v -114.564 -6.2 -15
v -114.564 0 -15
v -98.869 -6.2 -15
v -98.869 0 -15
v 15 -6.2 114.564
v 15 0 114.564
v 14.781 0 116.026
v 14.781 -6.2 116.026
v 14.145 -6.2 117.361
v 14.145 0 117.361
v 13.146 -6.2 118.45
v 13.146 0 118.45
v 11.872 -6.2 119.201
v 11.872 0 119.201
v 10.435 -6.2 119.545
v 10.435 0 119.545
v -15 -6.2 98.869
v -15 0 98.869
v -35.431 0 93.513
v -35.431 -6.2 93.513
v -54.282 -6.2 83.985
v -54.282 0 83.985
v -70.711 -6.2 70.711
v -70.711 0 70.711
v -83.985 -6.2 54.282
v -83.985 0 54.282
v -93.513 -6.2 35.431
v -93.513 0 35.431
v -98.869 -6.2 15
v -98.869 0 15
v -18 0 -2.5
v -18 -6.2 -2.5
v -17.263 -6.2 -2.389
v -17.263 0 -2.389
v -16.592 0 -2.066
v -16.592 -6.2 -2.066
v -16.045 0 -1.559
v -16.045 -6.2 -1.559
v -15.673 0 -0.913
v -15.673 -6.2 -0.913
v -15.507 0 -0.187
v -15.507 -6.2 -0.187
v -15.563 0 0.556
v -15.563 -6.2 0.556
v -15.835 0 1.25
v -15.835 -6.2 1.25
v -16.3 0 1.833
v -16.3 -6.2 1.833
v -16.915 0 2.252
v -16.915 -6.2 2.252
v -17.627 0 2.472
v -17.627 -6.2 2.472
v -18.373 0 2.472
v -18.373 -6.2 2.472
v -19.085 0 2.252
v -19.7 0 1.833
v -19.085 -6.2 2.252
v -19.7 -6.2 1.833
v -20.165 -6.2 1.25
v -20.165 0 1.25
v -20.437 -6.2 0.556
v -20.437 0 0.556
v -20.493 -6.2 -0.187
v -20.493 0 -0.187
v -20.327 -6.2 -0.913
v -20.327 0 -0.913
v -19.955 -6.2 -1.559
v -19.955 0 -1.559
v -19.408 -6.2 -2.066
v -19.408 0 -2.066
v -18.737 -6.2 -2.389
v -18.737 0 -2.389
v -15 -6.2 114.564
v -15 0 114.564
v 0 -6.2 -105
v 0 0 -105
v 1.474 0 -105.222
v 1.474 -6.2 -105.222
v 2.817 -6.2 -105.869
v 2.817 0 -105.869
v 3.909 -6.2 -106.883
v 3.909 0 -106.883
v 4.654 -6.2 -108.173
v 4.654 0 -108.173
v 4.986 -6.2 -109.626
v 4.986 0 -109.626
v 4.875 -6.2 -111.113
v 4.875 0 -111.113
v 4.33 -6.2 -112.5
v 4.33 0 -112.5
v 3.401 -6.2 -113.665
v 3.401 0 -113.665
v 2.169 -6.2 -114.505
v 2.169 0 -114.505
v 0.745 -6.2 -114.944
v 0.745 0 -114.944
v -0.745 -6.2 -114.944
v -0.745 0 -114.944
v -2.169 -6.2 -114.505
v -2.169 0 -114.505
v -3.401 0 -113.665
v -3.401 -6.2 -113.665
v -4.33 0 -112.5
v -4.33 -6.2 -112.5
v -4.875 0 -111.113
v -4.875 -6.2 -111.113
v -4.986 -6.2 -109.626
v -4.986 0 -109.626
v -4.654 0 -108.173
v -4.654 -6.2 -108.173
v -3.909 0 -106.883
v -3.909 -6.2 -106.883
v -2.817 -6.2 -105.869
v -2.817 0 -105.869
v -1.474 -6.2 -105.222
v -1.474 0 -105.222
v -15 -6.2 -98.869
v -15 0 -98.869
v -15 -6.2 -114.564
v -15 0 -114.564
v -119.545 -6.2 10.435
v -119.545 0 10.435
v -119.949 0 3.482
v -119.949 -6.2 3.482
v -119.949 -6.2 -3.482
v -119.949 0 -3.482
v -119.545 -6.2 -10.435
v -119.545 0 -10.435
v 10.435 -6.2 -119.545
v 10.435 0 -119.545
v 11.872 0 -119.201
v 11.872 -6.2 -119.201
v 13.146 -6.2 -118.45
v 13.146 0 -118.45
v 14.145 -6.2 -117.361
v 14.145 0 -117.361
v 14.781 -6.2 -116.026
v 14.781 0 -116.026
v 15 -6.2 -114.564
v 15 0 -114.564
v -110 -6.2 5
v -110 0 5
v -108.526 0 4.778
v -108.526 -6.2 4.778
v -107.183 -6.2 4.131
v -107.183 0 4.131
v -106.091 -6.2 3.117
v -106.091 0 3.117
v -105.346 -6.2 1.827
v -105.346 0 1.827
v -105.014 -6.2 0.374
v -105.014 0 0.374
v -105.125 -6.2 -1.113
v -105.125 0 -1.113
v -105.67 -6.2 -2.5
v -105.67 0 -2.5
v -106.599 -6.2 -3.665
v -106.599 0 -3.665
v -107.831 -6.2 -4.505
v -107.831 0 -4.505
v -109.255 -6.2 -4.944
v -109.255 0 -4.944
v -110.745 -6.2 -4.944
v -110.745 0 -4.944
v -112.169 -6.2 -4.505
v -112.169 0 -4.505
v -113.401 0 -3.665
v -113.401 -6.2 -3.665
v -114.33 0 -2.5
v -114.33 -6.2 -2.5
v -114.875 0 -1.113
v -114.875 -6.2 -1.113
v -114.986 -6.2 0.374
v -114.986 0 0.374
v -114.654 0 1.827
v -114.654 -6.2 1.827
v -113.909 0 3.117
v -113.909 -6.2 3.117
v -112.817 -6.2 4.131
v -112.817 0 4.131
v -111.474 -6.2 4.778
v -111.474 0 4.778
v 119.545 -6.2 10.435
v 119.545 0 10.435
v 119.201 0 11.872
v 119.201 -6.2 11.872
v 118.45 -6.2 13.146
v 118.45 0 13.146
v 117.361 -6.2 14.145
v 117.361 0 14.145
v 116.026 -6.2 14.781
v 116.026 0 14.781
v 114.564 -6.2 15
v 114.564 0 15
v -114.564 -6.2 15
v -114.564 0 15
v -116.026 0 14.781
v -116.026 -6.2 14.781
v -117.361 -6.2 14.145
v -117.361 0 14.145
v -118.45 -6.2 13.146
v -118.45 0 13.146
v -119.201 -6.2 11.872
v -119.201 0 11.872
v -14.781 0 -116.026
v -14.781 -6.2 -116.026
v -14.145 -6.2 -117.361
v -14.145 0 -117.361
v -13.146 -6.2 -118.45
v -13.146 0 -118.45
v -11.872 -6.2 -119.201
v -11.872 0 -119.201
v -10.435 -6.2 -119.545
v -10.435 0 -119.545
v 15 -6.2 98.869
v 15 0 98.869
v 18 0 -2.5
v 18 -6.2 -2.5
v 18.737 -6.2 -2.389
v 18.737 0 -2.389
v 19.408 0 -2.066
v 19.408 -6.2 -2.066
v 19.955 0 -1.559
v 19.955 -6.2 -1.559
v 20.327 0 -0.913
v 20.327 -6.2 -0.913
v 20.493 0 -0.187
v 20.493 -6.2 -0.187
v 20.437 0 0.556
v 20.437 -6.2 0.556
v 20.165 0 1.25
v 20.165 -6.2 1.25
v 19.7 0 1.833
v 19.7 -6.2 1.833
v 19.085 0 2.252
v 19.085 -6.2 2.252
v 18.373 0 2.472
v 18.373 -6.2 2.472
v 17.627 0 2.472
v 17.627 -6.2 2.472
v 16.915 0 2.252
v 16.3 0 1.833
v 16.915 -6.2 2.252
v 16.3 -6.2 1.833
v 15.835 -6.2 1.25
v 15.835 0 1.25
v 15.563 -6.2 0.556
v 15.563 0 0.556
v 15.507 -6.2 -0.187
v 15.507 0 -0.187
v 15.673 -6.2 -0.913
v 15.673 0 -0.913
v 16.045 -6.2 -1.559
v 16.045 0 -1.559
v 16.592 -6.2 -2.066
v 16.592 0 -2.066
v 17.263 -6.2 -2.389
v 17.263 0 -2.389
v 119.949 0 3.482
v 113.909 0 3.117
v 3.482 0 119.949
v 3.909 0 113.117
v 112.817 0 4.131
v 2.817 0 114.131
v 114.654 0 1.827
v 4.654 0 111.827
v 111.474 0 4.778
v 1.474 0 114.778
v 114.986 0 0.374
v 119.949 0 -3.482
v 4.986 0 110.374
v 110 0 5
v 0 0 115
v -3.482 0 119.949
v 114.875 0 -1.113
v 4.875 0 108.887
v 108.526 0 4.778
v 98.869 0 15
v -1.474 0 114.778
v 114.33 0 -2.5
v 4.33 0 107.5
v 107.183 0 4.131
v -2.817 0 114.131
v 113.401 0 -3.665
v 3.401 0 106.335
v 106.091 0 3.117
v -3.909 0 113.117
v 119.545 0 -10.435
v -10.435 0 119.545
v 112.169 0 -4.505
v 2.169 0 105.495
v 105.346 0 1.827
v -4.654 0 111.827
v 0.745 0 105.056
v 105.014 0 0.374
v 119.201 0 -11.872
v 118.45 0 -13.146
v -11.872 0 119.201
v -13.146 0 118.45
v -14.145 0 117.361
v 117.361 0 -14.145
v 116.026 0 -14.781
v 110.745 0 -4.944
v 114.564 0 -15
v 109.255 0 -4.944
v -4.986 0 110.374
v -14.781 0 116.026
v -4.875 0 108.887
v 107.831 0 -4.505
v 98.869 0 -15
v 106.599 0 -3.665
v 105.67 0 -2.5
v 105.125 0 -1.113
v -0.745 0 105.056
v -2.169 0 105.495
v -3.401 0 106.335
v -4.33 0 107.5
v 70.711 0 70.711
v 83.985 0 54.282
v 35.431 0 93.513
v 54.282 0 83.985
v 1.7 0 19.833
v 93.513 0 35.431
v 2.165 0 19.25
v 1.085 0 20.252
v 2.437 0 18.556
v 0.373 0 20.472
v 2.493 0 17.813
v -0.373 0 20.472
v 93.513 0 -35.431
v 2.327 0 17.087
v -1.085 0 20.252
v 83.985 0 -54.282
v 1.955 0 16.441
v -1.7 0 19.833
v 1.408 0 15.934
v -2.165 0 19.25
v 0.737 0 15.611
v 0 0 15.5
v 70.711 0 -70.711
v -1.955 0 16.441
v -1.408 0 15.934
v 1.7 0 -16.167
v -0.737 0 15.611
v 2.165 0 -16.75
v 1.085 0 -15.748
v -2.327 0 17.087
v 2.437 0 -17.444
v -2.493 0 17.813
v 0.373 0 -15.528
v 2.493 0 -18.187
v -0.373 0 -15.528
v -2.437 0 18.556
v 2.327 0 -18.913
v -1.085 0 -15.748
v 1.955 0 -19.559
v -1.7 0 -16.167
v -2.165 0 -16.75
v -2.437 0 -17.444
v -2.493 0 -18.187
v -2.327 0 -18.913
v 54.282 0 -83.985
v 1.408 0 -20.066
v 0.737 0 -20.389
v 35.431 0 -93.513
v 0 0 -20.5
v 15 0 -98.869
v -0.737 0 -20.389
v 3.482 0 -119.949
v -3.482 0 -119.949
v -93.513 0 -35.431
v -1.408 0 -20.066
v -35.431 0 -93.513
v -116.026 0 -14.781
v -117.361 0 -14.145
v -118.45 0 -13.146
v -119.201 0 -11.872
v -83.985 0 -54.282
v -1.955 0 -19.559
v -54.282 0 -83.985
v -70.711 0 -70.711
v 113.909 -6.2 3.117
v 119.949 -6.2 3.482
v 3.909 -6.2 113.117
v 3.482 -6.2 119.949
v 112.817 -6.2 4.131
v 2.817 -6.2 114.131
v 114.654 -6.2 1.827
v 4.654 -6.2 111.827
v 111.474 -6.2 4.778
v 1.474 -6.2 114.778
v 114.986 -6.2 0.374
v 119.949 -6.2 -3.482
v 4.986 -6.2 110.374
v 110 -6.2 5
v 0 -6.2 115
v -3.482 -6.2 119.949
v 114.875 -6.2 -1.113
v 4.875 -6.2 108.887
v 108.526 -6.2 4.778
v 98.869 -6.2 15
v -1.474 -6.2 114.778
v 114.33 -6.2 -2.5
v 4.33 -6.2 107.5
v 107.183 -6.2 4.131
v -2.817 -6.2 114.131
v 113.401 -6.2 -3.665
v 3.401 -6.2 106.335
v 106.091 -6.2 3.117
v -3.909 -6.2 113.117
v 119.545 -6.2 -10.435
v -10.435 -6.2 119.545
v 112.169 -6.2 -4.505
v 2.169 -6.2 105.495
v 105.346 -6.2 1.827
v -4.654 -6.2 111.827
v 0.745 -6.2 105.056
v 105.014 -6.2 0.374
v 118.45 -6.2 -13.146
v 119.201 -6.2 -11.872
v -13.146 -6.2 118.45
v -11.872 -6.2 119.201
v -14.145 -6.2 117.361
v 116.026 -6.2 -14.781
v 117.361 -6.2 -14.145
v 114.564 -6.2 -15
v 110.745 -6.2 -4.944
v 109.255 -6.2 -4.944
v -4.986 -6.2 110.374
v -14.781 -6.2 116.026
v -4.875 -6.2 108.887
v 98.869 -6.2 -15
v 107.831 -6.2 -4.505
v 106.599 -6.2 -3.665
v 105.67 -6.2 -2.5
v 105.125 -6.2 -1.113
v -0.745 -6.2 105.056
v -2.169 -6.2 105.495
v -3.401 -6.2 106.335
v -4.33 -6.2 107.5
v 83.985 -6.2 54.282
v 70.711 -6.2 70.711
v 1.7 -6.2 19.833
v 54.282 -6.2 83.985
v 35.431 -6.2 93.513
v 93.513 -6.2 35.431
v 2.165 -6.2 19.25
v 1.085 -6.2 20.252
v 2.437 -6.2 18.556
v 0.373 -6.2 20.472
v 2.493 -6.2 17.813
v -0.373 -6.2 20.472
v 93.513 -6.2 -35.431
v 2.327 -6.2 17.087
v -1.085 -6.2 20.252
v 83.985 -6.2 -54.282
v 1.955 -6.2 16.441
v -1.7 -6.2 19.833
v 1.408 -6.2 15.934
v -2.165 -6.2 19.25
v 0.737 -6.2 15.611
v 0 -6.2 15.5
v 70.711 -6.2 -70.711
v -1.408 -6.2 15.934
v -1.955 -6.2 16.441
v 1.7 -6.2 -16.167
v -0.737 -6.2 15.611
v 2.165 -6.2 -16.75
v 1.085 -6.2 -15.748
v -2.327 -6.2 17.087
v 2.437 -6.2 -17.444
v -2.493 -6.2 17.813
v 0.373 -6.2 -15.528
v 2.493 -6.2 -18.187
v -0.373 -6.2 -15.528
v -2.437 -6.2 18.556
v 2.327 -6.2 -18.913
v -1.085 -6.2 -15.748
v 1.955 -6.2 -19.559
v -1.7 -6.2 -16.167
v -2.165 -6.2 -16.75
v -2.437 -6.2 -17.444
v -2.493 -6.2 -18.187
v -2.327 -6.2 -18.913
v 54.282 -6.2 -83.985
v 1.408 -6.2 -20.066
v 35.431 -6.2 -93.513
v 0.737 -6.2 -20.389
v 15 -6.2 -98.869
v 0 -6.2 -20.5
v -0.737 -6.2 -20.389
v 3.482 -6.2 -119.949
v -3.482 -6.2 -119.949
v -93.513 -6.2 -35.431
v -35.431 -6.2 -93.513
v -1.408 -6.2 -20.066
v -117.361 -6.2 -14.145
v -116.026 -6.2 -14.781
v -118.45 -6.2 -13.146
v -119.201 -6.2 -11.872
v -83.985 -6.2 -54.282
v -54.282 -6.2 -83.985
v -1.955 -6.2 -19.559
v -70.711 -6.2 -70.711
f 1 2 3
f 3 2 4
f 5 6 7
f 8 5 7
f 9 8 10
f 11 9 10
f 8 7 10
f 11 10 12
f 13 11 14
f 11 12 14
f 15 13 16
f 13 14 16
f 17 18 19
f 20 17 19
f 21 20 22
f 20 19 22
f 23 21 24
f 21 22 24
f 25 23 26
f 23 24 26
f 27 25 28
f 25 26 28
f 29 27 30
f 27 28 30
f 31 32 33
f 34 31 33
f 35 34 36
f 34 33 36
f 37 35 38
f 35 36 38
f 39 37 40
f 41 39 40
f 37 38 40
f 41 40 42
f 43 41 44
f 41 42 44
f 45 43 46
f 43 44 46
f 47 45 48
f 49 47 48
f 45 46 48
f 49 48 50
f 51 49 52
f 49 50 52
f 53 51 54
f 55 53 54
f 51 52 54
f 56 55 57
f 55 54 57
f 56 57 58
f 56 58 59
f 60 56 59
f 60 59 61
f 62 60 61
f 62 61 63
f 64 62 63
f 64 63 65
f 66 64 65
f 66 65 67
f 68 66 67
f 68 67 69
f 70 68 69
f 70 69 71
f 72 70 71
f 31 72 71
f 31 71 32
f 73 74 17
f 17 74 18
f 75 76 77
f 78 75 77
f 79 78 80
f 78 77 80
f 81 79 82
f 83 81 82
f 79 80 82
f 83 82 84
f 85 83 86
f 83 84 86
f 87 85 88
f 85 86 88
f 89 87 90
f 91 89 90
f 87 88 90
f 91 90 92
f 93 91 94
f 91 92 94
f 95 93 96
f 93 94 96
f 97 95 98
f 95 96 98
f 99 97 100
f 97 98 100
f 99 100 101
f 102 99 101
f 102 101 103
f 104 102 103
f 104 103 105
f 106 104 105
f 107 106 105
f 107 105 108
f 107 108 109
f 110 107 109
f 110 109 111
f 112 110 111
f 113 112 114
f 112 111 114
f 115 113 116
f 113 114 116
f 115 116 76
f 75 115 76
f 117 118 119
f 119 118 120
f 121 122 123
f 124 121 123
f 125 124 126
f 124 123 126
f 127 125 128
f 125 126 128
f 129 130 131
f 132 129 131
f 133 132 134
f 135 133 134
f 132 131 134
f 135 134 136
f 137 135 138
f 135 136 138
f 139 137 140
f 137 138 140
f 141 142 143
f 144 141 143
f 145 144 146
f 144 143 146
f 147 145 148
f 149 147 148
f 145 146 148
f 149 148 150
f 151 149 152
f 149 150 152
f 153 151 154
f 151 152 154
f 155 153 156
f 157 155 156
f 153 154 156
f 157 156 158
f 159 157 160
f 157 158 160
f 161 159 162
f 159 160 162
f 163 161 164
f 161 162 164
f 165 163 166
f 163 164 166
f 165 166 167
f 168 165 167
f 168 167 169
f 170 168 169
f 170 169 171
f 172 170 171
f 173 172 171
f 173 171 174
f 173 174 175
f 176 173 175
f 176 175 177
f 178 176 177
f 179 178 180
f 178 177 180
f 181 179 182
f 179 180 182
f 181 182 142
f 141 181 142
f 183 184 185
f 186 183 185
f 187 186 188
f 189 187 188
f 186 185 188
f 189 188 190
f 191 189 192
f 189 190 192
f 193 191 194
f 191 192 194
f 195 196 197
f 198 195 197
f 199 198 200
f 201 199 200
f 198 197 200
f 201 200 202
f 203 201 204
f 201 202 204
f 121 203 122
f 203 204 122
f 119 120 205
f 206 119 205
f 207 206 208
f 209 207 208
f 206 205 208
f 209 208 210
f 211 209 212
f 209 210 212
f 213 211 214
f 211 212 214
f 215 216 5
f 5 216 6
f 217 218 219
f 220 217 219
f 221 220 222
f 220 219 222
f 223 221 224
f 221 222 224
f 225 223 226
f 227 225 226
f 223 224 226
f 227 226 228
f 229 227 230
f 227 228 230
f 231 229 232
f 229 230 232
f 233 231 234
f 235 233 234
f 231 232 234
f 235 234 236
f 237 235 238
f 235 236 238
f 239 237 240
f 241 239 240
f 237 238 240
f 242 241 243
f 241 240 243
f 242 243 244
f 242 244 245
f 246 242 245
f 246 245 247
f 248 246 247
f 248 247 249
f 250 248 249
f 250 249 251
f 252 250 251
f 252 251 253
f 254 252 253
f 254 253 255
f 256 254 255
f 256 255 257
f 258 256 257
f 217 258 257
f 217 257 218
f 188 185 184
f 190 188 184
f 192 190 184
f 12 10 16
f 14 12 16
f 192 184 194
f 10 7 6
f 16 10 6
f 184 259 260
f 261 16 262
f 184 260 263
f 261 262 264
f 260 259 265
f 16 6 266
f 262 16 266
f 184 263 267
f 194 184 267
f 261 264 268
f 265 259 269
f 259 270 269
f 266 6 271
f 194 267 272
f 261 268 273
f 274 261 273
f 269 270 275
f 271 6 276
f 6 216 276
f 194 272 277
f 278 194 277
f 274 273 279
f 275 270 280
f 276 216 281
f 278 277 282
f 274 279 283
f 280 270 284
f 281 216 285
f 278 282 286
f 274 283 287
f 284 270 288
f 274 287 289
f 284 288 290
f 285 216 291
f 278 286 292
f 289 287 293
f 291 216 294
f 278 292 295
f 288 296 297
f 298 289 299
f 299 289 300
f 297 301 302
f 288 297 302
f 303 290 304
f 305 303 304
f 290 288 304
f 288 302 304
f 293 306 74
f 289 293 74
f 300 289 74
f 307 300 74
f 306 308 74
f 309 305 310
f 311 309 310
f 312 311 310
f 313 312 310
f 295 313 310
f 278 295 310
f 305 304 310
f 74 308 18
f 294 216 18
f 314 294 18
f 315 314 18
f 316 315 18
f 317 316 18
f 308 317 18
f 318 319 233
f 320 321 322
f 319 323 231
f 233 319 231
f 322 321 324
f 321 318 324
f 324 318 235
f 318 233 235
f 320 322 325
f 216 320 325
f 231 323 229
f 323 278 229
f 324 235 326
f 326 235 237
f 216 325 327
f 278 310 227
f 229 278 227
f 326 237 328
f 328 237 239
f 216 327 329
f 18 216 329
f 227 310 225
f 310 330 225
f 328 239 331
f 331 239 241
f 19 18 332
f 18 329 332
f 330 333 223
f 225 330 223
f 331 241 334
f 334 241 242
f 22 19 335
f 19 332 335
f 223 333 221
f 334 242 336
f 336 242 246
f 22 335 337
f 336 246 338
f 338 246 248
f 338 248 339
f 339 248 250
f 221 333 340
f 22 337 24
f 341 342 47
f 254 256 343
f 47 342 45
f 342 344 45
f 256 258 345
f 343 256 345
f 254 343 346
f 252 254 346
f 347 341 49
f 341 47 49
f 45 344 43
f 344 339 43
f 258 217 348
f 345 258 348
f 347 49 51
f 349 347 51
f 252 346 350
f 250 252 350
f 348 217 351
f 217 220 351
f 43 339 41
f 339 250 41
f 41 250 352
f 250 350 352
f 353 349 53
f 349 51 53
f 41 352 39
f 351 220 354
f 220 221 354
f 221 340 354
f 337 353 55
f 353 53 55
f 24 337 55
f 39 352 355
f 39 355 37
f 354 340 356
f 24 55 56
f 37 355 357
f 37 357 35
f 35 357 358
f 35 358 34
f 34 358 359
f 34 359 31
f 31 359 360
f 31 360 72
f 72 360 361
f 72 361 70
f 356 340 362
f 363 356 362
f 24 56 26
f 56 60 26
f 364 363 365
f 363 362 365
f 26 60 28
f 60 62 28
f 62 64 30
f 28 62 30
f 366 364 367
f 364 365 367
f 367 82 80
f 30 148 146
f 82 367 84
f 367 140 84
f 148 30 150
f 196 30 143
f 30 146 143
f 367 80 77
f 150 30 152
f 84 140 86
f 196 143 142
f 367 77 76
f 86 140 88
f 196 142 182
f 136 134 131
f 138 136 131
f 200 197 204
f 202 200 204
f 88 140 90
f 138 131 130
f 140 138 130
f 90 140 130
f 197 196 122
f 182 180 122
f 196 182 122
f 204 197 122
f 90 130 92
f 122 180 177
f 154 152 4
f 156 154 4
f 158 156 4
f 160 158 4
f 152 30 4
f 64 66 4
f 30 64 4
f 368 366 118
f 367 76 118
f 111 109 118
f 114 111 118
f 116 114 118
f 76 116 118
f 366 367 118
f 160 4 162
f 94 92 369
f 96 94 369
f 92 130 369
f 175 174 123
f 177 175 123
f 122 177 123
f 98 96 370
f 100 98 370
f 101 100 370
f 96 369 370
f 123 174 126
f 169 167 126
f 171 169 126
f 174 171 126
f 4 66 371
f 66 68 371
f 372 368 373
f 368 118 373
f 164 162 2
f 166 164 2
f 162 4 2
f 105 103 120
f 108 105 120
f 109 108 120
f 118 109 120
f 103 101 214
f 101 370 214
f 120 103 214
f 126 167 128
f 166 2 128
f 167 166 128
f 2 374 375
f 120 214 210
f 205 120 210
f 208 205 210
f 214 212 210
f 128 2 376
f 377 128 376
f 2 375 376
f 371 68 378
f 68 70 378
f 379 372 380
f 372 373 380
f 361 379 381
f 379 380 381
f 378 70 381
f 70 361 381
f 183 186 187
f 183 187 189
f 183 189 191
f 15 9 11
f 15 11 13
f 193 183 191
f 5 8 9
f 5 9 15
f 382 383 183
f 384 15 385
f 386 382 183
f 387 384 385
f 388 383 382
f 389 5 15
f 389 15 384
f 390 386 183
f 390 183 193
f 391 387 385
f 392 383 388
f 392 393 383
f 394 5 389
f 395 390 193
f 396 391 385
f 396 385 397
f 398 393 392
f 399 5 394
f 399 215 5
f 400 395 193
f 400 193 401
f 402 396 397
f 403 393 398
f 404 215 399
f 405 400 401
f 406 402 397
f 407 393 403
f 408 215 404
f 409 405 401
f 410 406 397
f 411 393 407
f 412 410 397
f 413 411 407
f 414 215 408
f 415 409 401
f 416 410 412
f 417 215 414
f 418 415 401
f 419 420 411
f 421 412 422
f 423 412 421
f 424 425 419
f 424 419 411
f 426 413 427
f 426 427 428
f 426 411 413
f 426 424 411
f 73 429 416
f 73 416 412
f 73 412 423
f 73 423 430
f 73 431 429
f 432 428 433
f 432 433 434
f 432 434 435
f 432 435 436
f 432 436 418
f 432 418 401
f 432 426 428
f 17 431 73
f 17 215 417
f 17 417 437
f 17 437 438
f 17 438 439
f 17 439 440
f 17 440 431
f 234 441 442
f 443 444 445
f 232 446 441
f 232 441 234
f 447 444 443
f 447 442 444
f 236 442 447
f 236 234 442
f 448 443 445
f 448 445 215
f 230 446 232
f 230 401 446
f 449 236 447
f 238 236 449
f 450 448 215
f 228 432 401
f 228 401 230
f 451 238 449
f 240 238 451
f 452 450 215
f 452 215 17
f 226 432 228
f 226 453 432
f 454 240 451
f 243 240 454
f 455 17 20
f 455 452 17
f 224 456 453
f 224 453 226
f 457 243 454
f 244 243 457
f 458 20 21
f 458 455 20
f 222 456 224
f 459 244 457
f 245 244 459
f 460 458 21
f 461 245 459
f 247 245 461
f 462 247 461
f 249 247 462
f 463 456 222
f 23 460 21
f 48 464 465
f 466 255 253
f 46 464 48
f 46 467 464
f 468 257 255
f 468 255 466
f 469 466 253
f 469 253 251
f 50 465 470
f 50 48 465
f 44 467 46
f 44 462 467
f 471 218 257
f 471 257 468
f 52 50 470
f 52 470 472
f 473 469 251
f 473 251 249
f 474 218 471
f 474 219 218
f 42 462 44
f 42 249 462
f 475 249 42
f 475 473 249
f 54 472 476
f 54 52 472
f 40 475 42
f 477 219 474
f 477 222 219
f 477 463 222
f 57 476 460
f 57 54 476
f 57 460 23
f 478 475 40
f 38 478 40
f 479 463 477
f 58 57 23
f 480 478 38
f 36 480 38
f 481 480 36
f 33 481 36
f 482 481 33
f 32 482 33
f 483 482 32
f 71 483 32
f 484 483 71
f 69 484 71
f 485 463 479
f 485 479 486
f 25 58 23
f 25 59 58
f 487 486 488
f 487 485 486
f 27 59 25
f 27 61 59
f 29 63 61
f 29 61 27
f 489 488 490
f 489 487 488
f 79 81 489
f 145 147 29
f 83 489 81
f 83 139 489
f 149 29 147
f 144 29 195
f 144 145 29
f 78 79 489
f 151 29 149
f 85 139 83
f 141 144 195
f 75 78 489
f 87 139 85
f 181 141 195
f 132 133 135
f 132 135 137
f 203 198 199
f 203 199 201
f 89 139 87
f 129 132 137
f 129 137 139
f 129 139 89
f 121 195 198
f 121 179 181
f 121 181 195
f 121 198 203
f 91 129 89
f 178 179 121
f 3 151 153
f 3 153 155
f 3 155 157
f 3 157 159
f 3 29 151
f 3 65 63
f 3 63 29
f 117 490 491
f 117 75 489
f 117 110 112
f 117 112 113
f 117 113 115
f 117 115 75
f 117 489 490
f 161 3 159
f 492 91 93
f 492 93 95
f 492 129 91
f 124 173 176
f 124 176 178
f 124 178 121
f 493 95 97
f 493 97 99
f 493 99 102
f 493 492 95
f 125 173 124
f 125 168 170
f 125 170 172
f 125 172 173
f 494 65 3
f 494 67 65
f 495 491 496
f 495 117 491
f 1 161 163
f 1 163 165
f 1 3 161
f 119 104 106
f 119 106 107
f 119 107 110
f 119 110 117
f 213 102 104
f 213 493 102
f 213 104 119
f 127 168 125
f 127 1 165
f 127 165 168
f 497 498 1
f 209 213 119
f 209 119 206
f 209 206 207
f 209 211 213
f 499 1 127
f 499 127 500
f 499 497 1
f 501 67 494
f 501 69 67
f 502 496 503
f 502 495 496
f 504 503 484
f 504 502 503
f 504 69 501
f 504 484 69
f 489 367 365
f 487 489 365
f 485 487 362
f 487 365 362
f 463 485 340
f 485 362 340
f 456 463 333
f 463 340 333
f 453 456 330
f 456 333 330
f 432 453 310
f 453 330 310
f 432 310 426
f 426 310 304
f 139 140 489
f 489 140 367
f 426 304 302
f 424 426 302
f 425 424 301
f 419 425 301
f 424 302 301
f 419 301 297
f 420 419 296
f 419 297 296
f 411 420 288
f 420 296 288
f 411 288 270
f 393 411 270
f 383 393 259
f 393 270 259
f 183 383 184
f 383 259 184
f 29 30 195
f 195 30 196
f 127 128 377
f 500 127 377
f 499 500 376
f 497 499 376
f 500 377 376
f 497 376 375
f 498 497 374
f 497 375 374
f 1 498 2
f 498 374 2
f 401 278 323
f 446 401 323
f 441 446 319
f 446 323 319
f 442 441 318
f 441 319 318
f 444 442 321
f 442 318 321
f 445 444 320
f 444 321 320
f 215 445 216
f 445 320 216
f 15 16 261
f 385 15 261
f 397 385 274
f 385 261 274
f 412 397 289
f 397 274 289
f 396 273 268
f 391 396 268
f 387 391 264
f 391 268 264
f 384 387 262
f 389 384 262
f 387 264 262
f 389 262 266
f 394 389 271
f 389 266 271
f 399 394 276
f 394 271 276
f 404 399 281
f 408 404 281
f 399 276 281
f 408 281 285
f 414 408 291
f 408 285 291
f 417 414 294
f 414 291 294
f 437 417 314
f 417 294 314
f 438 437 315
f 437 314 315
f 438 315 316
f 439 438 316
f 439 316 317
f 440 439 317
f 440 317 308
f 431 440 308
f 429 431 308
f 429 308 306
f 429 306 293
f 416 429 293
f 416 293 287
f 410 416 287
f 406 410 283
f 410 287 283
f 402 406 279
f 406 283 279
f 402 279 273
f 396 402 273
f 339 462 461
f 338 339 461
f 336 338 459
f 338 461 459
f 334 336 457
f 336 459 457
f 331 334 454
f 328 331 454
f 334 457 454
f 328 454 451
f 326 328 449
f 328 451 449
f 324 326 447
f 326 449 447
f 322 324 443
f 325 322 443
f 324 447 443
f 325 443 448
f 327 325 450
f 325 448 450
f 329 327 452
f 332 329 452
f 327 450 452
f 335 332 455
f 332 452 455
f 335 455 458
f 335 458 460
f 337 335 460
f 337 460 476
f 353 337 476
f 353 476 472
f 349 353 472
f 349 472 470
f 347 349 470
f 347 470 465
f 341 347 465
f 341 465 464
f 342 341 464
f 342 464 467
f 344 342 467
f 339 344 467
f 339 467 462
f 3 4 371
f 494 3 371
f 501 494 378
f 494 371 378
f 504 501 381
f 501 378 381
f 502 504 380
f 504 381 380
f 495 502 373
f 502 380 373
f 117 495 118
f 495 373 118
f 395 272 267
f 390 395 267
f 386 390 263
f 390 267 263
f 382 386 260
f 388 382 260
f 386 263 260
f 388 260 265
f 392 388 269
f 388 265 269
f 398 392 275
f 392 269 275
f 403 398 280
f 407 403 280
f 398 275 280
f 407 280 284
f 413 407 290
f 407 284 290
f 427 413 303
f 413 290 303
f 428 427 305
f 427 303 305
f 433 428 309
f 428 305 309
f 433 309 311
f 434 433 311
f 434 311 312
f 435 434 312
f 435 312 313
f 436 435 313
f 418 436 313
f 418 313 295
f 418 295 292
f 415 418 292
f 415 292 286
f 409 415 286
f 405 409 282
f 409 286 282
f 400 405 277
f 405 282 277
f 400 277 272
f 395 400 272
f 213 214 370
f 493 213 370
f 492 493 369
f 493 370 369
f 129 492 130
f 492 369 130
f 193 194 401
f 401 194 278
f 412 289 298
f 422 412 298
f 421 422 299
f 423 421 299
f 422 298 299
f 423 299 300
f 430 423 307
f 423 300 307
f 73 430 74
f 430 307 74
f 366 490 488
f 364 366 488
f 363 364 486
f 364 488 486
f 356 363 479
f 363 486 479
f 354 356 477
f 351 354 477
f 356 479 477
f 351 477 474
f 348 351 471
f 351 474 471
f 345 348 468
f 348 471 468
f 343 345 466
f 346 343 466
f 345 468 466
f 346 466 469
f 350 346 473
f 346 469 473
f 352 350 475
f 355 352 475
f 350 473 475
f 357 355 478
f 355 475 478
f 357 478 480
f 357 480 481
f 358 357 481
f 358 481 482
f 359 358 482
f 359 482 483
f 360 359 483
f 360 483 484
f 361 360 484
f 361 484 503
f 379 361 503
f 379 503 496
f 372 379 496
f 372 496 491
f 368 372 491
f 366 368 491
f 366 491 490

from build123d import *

# Parameters (mm, degrees)
SKETCH1_R           = 5
BOSS_EXTRUDE1_DEPTH = 6.2
CUT_EXTRUDE1_REACH  = 171.819
SKETCH2_R           = 2.5


with BuildPart() as part:
    # Sketch1 → Boss-Extrude1 (new body)
    with BuildSketch(Plane(origin=(0, 0, 0), x_dir=(1, 0, 0), z_dir=(0, 1, 0))):
        with BuildLine():
            Line((-15, -114.564392374), (-15, -98.868599666))
            ThreePointArc((-15, -98.868599666), (-70.710678119, -70.710678119), (-98.868599666, -15))
            Line((-98.868599666, -15), (-114.564392374, -15))
            ThreePointArc((-114.564392374, -15), (-117.942711997, -13.686048904), (-119.545452912, -10.434782609))
            ThreePointArc((-119.545452912, -10.434782609), (-120, 0), (-119.545452912, 10.434782609))
            ThreePointArc((-119.545452912, 10.434782609), (-117.942711997, 13.686048904), (-114.564392374, 15))
            Line((-114.564392374, 15), (-98.868599666, 15))
            ThreePointArc((-98.868599666, 15), (-70.710678119, 70.710678119), (-15, 98.868599666))
            Line((-15, 98.868599666), (-15, 114.564392374))
            ThreePointArc((-15, 114.564392374), (-13.686048904, 117.942711997), (-10.434782609, 119.545452912))
            ThreePointArc((-10.434782609, 119.545452912), (0, 120), (10.434782609, 119.545452912))
            ThreePointArc((10.434782609, 119.545452912), (13.686048904, 117.942711997), (15, 114.564392374))
            Line((15, 114.564392374), (15, 98.868599666))
            ThreePointArc((15, 98.868599666), (70.710678119, 70.710678119), (98.868599666, 15))
            Line((98.868599666, 15), (114.564392374, 15))
            ThreePointArc((114.564392374, 15), (117.942711997, 13.686048904), (119.545452912, 10.434782609))
            ThreePointArc((119.545452912, 10.434782609), (120, 0), (119.545452912, -10.434782609))
            ThreePointArc((119.545452912, -10.434782609), (117.942711997, -13.686048904), (114.564392374, -15))
            Line((114.564392374, -15), (98.868599666, -15))
            ThreePointArc((98.868599666, -15), (70.710678119, -70.710678119), (15, -98.868599666))
            Line((15, -98.868599666), (15, -114.564392374))
            ThreePointArc((15, -114.564392374), (13.686048904, -117.942711997), (10.434782609, -119.545452912))
            ThreePointArc((10.434782609, -119.545452912), (0, -120), (-10.434782609, -119.545452912))
            ThreePointArc((-10.434782609, -119.545452912), (-13.686048904, -117.942711997), (-15, -114.564392374))
        make_face()
        with Locations(Location((0, -110, 0), (0, 0, 270))):
            Circle(SKETCH1_R, mode=Mode.SUBTRACT)
        with Locations(Location((-110, 0, 0), (0, 0, 270))):
            Circle(SKETCH1_R, mode=Mode.SUBTRACT)
        with Locations(Location((0, 110, 0), (0, 0, 270))):
            Circle(SKETCH1_R, mode=Mode.SUBTRACT)
        with Locations(Location((110, 0, 0), (0, 0, 270))):
            Circle(SKETCH1_R, mode=Mode.SUBTRACT)
    extrude(amount=-BOSS_EXTRUDE1_DEPTH)

    # Sketch2 → Cut-Extrude1 (cut, up to next)
    with BuildSketch(Plane.XZ.offset(6.2), mode=Mode.PRIVATE) as cut_extrude1_sk1:
        with Locations(Location((18, 0, 0), (0, 0, 270))):
            Circle(SKETCH2_R)
    cut_extrude1_tool1 = extrude(cut_extrude1_sk1.sketch, amount=-CUT_EXTRUDE1_REACH, mode=Mode.PRIVATE) & part.part
    # Sketch2 → Cut-Extrude1 (cut, up to next)
    with BuildSketch(Plane.XZ.offset(6.2), mode=Mode.PRIVATE) as cut_extrude1_sk2:
        with Locations(Location((0, -18, 0), (0, 0, 270))):
            Circle(SKETCH2_R)
    cut_extrude1_tool2 = extrude(cut_extrude1_sk2.sketch, amount=-CUT_EXTRUDE1_REACH, mode=Mode.PRIVATE) & part.part
    # Sketch2 → Cut-Extrude1 (cut, up to next)
    with BuildSketch(Plane.XZ.offset(6.2), mode=Mode.PRIVATE) as cut_extrude1_sk3:
        with Locations(Location((-18, 0, 0), (0, 0, 270))):
            Circle(SKETCH2_R)
    cut_extrude1_tool3 = extrude(cut_extrude1_sk3.sketch, amount=-CUT_EXTRUDE1_REACH, mode=Mode.PRIVATE) & part.part
    # Sketch2 → Cut-Extrude1 (cut, up to next)
    with BuildSketch(Plane.XZ.offset(6.2), mode=Mode.PRIVATE) as cut_extrude1_sk4:
        with Locations(Location((0, 18, 0), (0, 0, 270))):
            Circle(SKETCH2_R)
    cut_extrude1_tool4 = extrude(cut_extrude1_sk4.sketch, amount=-CUT_EXTRUDE1_REACH, mode=Mode.PRIVATE) & part.part
    add(cut_extrude1_tool1.solids().sort_by_distance((18, -6.2, 0))[0], mode=Mode.SUBTRACT)
    add(cut_extrude1_tool2.solids().sort_by_distance((0, -6.2, -18))[0], mode=Mode.SUBTRACT)
    add(cut_extrude1_tool3.solids().sort_by_distance((-18, -6.2, 0))[0], mode=Mode.SUBTRACT)
    add(cut_extrude1_tool4.solids().sort_by_distance((0, -6.2, 18))[0], mode=Mode.SUBTRACT)


solid = part.part
